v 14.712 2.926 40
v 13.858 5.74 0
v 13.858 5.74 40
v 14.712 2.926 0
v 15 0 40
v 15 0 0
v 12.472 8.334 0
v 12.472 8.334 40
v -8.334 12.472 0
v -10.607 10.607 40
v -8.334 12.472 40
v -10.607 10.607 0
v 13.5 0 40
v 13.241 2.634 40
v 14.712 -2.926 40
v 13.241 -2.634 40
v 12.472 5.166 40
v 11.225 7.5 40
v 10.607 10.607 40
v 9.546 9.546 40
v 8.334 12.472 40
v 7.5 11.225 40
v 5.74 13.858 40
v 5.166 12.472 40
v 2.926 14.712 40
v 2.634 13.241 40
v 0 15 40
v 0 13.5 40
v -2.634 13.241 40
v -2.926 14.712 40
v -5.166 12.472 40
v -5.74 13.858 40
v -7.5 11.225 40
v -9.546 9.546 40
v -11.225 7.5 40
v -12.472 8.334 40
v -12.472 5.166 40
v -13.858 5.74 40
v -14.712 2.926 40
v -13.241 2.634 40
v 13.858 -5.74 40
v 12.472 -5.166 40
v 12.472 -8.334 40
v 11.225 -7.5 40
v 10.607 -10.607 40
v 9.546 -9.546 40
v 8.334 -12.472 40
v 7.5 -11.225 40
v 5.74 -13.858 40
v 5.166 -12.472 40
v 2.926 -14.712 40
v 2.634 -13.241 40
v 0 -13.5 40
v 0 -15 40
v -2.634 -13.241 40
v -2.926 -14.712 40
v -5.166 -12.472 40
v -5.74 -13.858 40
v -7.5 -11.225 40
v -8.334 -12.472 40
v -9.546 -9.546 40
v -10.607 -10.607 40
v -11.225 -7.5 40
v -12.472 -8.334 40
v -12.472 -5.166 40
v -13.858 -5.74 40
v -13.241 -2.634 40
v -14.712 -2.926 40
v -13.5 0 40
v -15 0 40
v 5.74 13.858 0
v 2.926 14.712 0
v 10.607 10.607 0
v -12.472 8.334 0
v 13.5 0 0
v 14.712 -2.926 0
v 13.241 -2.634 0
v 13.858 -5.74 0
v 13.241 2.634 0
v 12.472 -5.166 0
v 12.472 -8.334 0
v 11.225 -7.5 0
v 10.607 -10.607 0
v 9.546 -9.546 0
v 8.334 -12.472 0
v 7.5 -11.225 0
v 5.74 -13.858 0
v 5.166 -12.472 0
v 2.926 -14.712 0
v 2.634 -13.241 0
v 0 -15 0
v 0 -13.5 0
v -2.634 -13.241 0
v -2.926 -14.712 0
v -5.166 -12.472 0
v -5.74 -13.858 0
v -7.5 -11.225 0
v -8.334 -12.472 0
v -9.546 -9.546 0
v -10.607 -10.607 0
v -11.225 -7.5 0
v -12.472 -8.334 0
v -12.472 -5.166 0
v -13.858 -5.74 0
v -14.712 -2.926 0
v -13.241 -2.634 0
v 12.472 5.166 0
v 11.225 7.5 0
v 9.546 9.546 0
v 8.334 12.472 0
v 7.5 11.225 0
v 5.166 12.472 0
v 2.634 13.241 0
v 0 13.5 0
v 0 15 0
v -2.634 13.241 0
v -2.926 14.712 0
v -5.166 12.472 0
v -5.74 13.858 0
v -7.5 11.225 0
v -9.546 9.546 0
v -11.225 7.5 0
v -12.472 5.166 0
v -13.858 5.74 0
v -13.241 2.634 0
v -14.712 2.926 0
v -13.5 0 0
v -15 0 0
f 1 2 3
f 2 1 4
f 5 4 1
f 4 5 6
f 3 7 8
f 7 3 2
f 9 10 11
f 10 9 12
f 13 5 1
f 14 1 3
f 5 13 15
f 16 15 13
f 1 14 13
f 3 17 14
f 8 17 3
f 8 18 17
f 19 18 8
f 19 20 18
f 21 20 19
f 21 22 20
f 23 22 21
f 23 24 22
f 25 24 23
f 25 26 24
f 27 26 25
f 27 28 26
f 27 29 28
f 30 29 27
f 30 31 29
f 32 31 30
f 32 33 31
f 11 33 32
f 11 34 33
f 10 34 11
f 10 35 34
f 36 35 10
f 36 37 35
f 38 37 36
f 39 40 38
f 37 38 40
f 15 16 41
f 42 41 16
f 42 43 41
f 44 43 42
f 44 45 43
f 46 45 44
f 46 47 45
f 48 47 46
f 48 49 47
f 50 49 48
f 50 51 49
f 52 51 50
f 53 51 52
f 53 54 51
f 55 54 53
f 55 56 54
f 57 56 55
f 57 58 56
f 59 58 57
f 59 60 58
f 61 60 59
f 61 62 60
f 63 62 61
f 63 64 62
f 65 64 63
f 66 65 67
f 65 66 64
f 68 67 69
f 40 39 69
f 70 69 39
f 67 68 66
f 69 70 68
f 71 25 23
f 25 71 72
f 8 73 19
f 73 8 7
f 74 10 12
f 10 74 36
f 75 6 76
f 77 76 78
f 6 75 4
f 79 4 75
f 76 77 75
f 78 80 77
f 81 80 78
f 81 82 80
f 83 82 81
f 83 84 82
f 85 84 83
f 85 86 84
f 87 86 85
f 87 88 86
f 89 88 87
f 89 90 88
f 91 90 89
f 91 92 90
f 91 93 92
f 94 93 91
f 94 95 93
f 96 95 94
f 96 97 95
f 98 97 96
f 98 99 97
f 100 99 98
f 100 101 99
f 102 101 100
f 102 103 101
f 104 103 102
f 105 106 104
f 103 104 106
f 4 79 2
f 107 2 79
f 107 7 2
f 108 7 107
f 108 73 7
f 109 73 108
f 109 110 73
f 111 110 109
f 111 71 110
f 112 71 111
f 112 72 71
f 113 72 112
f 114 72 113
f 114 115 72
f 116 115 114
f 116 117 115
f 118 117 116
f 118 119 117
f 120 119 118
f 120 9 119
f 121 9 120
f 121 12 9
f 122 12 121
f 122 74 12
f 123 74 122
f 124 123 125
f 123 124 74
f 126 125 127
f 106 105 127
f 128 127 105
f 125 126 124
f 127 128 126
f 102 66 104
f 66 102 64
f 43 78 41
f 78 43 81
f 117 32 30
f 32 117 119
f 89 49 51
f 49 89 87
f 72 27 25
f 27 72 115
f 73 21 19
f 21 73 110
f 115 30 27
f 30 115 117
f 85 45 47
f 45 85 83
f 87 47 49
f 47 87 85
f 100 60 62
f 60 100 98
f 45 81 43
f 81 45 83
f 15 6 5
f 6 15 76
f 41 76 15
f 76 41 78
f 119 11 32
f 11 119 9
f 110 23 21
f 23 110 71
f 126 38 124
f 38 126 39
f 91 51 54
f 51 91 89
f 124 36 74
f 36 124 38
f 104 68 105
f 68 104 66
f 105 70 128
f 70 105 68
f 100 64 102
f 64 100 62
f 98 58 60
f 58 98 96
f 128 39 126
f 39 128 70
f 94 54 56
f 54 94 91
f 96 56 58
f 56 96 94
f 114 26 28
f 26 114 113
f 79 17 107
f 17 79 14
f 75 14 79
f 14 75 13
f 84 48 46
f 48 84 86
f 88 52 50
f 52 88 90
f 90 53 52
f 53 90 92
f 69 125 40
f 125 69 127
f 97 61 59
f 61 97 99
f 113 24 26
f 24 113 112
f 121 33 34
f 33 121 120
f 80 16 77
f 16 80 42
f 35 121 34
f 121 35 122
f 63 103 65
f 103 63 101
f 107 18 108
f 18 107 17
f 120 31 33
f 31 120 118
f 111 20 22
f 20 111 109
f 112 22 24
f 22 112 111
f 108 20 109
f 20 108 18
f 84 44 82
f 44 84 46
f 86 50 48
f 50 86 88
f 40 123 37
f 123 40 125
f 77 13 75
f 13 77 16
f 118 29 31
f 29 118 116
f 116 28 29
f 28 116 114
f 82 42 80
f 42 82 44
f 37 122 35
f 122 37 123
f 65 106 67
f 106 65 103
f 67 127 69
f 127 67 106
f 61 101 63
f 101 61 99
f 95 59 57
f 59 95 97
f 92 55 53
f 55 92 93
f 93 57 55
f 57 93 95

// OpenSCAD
$fn = 32;

// ----------------------------------------------------------------------
// Thin tube: 1.5 mm wall
// ----------------------------------------------------------------------

// --- parameters (mm) ---
tube_od = 30;             // outer diameter
tube_h = 40;              // height, Z
wall = 1.5;               // wall thickness

difference() {
  cylinder(h = tube_h, d = tube_od);
  translate([0, 0, -1]) cylinder(h = tube_h + 2, d = tube_od - 2 * wall);
}
